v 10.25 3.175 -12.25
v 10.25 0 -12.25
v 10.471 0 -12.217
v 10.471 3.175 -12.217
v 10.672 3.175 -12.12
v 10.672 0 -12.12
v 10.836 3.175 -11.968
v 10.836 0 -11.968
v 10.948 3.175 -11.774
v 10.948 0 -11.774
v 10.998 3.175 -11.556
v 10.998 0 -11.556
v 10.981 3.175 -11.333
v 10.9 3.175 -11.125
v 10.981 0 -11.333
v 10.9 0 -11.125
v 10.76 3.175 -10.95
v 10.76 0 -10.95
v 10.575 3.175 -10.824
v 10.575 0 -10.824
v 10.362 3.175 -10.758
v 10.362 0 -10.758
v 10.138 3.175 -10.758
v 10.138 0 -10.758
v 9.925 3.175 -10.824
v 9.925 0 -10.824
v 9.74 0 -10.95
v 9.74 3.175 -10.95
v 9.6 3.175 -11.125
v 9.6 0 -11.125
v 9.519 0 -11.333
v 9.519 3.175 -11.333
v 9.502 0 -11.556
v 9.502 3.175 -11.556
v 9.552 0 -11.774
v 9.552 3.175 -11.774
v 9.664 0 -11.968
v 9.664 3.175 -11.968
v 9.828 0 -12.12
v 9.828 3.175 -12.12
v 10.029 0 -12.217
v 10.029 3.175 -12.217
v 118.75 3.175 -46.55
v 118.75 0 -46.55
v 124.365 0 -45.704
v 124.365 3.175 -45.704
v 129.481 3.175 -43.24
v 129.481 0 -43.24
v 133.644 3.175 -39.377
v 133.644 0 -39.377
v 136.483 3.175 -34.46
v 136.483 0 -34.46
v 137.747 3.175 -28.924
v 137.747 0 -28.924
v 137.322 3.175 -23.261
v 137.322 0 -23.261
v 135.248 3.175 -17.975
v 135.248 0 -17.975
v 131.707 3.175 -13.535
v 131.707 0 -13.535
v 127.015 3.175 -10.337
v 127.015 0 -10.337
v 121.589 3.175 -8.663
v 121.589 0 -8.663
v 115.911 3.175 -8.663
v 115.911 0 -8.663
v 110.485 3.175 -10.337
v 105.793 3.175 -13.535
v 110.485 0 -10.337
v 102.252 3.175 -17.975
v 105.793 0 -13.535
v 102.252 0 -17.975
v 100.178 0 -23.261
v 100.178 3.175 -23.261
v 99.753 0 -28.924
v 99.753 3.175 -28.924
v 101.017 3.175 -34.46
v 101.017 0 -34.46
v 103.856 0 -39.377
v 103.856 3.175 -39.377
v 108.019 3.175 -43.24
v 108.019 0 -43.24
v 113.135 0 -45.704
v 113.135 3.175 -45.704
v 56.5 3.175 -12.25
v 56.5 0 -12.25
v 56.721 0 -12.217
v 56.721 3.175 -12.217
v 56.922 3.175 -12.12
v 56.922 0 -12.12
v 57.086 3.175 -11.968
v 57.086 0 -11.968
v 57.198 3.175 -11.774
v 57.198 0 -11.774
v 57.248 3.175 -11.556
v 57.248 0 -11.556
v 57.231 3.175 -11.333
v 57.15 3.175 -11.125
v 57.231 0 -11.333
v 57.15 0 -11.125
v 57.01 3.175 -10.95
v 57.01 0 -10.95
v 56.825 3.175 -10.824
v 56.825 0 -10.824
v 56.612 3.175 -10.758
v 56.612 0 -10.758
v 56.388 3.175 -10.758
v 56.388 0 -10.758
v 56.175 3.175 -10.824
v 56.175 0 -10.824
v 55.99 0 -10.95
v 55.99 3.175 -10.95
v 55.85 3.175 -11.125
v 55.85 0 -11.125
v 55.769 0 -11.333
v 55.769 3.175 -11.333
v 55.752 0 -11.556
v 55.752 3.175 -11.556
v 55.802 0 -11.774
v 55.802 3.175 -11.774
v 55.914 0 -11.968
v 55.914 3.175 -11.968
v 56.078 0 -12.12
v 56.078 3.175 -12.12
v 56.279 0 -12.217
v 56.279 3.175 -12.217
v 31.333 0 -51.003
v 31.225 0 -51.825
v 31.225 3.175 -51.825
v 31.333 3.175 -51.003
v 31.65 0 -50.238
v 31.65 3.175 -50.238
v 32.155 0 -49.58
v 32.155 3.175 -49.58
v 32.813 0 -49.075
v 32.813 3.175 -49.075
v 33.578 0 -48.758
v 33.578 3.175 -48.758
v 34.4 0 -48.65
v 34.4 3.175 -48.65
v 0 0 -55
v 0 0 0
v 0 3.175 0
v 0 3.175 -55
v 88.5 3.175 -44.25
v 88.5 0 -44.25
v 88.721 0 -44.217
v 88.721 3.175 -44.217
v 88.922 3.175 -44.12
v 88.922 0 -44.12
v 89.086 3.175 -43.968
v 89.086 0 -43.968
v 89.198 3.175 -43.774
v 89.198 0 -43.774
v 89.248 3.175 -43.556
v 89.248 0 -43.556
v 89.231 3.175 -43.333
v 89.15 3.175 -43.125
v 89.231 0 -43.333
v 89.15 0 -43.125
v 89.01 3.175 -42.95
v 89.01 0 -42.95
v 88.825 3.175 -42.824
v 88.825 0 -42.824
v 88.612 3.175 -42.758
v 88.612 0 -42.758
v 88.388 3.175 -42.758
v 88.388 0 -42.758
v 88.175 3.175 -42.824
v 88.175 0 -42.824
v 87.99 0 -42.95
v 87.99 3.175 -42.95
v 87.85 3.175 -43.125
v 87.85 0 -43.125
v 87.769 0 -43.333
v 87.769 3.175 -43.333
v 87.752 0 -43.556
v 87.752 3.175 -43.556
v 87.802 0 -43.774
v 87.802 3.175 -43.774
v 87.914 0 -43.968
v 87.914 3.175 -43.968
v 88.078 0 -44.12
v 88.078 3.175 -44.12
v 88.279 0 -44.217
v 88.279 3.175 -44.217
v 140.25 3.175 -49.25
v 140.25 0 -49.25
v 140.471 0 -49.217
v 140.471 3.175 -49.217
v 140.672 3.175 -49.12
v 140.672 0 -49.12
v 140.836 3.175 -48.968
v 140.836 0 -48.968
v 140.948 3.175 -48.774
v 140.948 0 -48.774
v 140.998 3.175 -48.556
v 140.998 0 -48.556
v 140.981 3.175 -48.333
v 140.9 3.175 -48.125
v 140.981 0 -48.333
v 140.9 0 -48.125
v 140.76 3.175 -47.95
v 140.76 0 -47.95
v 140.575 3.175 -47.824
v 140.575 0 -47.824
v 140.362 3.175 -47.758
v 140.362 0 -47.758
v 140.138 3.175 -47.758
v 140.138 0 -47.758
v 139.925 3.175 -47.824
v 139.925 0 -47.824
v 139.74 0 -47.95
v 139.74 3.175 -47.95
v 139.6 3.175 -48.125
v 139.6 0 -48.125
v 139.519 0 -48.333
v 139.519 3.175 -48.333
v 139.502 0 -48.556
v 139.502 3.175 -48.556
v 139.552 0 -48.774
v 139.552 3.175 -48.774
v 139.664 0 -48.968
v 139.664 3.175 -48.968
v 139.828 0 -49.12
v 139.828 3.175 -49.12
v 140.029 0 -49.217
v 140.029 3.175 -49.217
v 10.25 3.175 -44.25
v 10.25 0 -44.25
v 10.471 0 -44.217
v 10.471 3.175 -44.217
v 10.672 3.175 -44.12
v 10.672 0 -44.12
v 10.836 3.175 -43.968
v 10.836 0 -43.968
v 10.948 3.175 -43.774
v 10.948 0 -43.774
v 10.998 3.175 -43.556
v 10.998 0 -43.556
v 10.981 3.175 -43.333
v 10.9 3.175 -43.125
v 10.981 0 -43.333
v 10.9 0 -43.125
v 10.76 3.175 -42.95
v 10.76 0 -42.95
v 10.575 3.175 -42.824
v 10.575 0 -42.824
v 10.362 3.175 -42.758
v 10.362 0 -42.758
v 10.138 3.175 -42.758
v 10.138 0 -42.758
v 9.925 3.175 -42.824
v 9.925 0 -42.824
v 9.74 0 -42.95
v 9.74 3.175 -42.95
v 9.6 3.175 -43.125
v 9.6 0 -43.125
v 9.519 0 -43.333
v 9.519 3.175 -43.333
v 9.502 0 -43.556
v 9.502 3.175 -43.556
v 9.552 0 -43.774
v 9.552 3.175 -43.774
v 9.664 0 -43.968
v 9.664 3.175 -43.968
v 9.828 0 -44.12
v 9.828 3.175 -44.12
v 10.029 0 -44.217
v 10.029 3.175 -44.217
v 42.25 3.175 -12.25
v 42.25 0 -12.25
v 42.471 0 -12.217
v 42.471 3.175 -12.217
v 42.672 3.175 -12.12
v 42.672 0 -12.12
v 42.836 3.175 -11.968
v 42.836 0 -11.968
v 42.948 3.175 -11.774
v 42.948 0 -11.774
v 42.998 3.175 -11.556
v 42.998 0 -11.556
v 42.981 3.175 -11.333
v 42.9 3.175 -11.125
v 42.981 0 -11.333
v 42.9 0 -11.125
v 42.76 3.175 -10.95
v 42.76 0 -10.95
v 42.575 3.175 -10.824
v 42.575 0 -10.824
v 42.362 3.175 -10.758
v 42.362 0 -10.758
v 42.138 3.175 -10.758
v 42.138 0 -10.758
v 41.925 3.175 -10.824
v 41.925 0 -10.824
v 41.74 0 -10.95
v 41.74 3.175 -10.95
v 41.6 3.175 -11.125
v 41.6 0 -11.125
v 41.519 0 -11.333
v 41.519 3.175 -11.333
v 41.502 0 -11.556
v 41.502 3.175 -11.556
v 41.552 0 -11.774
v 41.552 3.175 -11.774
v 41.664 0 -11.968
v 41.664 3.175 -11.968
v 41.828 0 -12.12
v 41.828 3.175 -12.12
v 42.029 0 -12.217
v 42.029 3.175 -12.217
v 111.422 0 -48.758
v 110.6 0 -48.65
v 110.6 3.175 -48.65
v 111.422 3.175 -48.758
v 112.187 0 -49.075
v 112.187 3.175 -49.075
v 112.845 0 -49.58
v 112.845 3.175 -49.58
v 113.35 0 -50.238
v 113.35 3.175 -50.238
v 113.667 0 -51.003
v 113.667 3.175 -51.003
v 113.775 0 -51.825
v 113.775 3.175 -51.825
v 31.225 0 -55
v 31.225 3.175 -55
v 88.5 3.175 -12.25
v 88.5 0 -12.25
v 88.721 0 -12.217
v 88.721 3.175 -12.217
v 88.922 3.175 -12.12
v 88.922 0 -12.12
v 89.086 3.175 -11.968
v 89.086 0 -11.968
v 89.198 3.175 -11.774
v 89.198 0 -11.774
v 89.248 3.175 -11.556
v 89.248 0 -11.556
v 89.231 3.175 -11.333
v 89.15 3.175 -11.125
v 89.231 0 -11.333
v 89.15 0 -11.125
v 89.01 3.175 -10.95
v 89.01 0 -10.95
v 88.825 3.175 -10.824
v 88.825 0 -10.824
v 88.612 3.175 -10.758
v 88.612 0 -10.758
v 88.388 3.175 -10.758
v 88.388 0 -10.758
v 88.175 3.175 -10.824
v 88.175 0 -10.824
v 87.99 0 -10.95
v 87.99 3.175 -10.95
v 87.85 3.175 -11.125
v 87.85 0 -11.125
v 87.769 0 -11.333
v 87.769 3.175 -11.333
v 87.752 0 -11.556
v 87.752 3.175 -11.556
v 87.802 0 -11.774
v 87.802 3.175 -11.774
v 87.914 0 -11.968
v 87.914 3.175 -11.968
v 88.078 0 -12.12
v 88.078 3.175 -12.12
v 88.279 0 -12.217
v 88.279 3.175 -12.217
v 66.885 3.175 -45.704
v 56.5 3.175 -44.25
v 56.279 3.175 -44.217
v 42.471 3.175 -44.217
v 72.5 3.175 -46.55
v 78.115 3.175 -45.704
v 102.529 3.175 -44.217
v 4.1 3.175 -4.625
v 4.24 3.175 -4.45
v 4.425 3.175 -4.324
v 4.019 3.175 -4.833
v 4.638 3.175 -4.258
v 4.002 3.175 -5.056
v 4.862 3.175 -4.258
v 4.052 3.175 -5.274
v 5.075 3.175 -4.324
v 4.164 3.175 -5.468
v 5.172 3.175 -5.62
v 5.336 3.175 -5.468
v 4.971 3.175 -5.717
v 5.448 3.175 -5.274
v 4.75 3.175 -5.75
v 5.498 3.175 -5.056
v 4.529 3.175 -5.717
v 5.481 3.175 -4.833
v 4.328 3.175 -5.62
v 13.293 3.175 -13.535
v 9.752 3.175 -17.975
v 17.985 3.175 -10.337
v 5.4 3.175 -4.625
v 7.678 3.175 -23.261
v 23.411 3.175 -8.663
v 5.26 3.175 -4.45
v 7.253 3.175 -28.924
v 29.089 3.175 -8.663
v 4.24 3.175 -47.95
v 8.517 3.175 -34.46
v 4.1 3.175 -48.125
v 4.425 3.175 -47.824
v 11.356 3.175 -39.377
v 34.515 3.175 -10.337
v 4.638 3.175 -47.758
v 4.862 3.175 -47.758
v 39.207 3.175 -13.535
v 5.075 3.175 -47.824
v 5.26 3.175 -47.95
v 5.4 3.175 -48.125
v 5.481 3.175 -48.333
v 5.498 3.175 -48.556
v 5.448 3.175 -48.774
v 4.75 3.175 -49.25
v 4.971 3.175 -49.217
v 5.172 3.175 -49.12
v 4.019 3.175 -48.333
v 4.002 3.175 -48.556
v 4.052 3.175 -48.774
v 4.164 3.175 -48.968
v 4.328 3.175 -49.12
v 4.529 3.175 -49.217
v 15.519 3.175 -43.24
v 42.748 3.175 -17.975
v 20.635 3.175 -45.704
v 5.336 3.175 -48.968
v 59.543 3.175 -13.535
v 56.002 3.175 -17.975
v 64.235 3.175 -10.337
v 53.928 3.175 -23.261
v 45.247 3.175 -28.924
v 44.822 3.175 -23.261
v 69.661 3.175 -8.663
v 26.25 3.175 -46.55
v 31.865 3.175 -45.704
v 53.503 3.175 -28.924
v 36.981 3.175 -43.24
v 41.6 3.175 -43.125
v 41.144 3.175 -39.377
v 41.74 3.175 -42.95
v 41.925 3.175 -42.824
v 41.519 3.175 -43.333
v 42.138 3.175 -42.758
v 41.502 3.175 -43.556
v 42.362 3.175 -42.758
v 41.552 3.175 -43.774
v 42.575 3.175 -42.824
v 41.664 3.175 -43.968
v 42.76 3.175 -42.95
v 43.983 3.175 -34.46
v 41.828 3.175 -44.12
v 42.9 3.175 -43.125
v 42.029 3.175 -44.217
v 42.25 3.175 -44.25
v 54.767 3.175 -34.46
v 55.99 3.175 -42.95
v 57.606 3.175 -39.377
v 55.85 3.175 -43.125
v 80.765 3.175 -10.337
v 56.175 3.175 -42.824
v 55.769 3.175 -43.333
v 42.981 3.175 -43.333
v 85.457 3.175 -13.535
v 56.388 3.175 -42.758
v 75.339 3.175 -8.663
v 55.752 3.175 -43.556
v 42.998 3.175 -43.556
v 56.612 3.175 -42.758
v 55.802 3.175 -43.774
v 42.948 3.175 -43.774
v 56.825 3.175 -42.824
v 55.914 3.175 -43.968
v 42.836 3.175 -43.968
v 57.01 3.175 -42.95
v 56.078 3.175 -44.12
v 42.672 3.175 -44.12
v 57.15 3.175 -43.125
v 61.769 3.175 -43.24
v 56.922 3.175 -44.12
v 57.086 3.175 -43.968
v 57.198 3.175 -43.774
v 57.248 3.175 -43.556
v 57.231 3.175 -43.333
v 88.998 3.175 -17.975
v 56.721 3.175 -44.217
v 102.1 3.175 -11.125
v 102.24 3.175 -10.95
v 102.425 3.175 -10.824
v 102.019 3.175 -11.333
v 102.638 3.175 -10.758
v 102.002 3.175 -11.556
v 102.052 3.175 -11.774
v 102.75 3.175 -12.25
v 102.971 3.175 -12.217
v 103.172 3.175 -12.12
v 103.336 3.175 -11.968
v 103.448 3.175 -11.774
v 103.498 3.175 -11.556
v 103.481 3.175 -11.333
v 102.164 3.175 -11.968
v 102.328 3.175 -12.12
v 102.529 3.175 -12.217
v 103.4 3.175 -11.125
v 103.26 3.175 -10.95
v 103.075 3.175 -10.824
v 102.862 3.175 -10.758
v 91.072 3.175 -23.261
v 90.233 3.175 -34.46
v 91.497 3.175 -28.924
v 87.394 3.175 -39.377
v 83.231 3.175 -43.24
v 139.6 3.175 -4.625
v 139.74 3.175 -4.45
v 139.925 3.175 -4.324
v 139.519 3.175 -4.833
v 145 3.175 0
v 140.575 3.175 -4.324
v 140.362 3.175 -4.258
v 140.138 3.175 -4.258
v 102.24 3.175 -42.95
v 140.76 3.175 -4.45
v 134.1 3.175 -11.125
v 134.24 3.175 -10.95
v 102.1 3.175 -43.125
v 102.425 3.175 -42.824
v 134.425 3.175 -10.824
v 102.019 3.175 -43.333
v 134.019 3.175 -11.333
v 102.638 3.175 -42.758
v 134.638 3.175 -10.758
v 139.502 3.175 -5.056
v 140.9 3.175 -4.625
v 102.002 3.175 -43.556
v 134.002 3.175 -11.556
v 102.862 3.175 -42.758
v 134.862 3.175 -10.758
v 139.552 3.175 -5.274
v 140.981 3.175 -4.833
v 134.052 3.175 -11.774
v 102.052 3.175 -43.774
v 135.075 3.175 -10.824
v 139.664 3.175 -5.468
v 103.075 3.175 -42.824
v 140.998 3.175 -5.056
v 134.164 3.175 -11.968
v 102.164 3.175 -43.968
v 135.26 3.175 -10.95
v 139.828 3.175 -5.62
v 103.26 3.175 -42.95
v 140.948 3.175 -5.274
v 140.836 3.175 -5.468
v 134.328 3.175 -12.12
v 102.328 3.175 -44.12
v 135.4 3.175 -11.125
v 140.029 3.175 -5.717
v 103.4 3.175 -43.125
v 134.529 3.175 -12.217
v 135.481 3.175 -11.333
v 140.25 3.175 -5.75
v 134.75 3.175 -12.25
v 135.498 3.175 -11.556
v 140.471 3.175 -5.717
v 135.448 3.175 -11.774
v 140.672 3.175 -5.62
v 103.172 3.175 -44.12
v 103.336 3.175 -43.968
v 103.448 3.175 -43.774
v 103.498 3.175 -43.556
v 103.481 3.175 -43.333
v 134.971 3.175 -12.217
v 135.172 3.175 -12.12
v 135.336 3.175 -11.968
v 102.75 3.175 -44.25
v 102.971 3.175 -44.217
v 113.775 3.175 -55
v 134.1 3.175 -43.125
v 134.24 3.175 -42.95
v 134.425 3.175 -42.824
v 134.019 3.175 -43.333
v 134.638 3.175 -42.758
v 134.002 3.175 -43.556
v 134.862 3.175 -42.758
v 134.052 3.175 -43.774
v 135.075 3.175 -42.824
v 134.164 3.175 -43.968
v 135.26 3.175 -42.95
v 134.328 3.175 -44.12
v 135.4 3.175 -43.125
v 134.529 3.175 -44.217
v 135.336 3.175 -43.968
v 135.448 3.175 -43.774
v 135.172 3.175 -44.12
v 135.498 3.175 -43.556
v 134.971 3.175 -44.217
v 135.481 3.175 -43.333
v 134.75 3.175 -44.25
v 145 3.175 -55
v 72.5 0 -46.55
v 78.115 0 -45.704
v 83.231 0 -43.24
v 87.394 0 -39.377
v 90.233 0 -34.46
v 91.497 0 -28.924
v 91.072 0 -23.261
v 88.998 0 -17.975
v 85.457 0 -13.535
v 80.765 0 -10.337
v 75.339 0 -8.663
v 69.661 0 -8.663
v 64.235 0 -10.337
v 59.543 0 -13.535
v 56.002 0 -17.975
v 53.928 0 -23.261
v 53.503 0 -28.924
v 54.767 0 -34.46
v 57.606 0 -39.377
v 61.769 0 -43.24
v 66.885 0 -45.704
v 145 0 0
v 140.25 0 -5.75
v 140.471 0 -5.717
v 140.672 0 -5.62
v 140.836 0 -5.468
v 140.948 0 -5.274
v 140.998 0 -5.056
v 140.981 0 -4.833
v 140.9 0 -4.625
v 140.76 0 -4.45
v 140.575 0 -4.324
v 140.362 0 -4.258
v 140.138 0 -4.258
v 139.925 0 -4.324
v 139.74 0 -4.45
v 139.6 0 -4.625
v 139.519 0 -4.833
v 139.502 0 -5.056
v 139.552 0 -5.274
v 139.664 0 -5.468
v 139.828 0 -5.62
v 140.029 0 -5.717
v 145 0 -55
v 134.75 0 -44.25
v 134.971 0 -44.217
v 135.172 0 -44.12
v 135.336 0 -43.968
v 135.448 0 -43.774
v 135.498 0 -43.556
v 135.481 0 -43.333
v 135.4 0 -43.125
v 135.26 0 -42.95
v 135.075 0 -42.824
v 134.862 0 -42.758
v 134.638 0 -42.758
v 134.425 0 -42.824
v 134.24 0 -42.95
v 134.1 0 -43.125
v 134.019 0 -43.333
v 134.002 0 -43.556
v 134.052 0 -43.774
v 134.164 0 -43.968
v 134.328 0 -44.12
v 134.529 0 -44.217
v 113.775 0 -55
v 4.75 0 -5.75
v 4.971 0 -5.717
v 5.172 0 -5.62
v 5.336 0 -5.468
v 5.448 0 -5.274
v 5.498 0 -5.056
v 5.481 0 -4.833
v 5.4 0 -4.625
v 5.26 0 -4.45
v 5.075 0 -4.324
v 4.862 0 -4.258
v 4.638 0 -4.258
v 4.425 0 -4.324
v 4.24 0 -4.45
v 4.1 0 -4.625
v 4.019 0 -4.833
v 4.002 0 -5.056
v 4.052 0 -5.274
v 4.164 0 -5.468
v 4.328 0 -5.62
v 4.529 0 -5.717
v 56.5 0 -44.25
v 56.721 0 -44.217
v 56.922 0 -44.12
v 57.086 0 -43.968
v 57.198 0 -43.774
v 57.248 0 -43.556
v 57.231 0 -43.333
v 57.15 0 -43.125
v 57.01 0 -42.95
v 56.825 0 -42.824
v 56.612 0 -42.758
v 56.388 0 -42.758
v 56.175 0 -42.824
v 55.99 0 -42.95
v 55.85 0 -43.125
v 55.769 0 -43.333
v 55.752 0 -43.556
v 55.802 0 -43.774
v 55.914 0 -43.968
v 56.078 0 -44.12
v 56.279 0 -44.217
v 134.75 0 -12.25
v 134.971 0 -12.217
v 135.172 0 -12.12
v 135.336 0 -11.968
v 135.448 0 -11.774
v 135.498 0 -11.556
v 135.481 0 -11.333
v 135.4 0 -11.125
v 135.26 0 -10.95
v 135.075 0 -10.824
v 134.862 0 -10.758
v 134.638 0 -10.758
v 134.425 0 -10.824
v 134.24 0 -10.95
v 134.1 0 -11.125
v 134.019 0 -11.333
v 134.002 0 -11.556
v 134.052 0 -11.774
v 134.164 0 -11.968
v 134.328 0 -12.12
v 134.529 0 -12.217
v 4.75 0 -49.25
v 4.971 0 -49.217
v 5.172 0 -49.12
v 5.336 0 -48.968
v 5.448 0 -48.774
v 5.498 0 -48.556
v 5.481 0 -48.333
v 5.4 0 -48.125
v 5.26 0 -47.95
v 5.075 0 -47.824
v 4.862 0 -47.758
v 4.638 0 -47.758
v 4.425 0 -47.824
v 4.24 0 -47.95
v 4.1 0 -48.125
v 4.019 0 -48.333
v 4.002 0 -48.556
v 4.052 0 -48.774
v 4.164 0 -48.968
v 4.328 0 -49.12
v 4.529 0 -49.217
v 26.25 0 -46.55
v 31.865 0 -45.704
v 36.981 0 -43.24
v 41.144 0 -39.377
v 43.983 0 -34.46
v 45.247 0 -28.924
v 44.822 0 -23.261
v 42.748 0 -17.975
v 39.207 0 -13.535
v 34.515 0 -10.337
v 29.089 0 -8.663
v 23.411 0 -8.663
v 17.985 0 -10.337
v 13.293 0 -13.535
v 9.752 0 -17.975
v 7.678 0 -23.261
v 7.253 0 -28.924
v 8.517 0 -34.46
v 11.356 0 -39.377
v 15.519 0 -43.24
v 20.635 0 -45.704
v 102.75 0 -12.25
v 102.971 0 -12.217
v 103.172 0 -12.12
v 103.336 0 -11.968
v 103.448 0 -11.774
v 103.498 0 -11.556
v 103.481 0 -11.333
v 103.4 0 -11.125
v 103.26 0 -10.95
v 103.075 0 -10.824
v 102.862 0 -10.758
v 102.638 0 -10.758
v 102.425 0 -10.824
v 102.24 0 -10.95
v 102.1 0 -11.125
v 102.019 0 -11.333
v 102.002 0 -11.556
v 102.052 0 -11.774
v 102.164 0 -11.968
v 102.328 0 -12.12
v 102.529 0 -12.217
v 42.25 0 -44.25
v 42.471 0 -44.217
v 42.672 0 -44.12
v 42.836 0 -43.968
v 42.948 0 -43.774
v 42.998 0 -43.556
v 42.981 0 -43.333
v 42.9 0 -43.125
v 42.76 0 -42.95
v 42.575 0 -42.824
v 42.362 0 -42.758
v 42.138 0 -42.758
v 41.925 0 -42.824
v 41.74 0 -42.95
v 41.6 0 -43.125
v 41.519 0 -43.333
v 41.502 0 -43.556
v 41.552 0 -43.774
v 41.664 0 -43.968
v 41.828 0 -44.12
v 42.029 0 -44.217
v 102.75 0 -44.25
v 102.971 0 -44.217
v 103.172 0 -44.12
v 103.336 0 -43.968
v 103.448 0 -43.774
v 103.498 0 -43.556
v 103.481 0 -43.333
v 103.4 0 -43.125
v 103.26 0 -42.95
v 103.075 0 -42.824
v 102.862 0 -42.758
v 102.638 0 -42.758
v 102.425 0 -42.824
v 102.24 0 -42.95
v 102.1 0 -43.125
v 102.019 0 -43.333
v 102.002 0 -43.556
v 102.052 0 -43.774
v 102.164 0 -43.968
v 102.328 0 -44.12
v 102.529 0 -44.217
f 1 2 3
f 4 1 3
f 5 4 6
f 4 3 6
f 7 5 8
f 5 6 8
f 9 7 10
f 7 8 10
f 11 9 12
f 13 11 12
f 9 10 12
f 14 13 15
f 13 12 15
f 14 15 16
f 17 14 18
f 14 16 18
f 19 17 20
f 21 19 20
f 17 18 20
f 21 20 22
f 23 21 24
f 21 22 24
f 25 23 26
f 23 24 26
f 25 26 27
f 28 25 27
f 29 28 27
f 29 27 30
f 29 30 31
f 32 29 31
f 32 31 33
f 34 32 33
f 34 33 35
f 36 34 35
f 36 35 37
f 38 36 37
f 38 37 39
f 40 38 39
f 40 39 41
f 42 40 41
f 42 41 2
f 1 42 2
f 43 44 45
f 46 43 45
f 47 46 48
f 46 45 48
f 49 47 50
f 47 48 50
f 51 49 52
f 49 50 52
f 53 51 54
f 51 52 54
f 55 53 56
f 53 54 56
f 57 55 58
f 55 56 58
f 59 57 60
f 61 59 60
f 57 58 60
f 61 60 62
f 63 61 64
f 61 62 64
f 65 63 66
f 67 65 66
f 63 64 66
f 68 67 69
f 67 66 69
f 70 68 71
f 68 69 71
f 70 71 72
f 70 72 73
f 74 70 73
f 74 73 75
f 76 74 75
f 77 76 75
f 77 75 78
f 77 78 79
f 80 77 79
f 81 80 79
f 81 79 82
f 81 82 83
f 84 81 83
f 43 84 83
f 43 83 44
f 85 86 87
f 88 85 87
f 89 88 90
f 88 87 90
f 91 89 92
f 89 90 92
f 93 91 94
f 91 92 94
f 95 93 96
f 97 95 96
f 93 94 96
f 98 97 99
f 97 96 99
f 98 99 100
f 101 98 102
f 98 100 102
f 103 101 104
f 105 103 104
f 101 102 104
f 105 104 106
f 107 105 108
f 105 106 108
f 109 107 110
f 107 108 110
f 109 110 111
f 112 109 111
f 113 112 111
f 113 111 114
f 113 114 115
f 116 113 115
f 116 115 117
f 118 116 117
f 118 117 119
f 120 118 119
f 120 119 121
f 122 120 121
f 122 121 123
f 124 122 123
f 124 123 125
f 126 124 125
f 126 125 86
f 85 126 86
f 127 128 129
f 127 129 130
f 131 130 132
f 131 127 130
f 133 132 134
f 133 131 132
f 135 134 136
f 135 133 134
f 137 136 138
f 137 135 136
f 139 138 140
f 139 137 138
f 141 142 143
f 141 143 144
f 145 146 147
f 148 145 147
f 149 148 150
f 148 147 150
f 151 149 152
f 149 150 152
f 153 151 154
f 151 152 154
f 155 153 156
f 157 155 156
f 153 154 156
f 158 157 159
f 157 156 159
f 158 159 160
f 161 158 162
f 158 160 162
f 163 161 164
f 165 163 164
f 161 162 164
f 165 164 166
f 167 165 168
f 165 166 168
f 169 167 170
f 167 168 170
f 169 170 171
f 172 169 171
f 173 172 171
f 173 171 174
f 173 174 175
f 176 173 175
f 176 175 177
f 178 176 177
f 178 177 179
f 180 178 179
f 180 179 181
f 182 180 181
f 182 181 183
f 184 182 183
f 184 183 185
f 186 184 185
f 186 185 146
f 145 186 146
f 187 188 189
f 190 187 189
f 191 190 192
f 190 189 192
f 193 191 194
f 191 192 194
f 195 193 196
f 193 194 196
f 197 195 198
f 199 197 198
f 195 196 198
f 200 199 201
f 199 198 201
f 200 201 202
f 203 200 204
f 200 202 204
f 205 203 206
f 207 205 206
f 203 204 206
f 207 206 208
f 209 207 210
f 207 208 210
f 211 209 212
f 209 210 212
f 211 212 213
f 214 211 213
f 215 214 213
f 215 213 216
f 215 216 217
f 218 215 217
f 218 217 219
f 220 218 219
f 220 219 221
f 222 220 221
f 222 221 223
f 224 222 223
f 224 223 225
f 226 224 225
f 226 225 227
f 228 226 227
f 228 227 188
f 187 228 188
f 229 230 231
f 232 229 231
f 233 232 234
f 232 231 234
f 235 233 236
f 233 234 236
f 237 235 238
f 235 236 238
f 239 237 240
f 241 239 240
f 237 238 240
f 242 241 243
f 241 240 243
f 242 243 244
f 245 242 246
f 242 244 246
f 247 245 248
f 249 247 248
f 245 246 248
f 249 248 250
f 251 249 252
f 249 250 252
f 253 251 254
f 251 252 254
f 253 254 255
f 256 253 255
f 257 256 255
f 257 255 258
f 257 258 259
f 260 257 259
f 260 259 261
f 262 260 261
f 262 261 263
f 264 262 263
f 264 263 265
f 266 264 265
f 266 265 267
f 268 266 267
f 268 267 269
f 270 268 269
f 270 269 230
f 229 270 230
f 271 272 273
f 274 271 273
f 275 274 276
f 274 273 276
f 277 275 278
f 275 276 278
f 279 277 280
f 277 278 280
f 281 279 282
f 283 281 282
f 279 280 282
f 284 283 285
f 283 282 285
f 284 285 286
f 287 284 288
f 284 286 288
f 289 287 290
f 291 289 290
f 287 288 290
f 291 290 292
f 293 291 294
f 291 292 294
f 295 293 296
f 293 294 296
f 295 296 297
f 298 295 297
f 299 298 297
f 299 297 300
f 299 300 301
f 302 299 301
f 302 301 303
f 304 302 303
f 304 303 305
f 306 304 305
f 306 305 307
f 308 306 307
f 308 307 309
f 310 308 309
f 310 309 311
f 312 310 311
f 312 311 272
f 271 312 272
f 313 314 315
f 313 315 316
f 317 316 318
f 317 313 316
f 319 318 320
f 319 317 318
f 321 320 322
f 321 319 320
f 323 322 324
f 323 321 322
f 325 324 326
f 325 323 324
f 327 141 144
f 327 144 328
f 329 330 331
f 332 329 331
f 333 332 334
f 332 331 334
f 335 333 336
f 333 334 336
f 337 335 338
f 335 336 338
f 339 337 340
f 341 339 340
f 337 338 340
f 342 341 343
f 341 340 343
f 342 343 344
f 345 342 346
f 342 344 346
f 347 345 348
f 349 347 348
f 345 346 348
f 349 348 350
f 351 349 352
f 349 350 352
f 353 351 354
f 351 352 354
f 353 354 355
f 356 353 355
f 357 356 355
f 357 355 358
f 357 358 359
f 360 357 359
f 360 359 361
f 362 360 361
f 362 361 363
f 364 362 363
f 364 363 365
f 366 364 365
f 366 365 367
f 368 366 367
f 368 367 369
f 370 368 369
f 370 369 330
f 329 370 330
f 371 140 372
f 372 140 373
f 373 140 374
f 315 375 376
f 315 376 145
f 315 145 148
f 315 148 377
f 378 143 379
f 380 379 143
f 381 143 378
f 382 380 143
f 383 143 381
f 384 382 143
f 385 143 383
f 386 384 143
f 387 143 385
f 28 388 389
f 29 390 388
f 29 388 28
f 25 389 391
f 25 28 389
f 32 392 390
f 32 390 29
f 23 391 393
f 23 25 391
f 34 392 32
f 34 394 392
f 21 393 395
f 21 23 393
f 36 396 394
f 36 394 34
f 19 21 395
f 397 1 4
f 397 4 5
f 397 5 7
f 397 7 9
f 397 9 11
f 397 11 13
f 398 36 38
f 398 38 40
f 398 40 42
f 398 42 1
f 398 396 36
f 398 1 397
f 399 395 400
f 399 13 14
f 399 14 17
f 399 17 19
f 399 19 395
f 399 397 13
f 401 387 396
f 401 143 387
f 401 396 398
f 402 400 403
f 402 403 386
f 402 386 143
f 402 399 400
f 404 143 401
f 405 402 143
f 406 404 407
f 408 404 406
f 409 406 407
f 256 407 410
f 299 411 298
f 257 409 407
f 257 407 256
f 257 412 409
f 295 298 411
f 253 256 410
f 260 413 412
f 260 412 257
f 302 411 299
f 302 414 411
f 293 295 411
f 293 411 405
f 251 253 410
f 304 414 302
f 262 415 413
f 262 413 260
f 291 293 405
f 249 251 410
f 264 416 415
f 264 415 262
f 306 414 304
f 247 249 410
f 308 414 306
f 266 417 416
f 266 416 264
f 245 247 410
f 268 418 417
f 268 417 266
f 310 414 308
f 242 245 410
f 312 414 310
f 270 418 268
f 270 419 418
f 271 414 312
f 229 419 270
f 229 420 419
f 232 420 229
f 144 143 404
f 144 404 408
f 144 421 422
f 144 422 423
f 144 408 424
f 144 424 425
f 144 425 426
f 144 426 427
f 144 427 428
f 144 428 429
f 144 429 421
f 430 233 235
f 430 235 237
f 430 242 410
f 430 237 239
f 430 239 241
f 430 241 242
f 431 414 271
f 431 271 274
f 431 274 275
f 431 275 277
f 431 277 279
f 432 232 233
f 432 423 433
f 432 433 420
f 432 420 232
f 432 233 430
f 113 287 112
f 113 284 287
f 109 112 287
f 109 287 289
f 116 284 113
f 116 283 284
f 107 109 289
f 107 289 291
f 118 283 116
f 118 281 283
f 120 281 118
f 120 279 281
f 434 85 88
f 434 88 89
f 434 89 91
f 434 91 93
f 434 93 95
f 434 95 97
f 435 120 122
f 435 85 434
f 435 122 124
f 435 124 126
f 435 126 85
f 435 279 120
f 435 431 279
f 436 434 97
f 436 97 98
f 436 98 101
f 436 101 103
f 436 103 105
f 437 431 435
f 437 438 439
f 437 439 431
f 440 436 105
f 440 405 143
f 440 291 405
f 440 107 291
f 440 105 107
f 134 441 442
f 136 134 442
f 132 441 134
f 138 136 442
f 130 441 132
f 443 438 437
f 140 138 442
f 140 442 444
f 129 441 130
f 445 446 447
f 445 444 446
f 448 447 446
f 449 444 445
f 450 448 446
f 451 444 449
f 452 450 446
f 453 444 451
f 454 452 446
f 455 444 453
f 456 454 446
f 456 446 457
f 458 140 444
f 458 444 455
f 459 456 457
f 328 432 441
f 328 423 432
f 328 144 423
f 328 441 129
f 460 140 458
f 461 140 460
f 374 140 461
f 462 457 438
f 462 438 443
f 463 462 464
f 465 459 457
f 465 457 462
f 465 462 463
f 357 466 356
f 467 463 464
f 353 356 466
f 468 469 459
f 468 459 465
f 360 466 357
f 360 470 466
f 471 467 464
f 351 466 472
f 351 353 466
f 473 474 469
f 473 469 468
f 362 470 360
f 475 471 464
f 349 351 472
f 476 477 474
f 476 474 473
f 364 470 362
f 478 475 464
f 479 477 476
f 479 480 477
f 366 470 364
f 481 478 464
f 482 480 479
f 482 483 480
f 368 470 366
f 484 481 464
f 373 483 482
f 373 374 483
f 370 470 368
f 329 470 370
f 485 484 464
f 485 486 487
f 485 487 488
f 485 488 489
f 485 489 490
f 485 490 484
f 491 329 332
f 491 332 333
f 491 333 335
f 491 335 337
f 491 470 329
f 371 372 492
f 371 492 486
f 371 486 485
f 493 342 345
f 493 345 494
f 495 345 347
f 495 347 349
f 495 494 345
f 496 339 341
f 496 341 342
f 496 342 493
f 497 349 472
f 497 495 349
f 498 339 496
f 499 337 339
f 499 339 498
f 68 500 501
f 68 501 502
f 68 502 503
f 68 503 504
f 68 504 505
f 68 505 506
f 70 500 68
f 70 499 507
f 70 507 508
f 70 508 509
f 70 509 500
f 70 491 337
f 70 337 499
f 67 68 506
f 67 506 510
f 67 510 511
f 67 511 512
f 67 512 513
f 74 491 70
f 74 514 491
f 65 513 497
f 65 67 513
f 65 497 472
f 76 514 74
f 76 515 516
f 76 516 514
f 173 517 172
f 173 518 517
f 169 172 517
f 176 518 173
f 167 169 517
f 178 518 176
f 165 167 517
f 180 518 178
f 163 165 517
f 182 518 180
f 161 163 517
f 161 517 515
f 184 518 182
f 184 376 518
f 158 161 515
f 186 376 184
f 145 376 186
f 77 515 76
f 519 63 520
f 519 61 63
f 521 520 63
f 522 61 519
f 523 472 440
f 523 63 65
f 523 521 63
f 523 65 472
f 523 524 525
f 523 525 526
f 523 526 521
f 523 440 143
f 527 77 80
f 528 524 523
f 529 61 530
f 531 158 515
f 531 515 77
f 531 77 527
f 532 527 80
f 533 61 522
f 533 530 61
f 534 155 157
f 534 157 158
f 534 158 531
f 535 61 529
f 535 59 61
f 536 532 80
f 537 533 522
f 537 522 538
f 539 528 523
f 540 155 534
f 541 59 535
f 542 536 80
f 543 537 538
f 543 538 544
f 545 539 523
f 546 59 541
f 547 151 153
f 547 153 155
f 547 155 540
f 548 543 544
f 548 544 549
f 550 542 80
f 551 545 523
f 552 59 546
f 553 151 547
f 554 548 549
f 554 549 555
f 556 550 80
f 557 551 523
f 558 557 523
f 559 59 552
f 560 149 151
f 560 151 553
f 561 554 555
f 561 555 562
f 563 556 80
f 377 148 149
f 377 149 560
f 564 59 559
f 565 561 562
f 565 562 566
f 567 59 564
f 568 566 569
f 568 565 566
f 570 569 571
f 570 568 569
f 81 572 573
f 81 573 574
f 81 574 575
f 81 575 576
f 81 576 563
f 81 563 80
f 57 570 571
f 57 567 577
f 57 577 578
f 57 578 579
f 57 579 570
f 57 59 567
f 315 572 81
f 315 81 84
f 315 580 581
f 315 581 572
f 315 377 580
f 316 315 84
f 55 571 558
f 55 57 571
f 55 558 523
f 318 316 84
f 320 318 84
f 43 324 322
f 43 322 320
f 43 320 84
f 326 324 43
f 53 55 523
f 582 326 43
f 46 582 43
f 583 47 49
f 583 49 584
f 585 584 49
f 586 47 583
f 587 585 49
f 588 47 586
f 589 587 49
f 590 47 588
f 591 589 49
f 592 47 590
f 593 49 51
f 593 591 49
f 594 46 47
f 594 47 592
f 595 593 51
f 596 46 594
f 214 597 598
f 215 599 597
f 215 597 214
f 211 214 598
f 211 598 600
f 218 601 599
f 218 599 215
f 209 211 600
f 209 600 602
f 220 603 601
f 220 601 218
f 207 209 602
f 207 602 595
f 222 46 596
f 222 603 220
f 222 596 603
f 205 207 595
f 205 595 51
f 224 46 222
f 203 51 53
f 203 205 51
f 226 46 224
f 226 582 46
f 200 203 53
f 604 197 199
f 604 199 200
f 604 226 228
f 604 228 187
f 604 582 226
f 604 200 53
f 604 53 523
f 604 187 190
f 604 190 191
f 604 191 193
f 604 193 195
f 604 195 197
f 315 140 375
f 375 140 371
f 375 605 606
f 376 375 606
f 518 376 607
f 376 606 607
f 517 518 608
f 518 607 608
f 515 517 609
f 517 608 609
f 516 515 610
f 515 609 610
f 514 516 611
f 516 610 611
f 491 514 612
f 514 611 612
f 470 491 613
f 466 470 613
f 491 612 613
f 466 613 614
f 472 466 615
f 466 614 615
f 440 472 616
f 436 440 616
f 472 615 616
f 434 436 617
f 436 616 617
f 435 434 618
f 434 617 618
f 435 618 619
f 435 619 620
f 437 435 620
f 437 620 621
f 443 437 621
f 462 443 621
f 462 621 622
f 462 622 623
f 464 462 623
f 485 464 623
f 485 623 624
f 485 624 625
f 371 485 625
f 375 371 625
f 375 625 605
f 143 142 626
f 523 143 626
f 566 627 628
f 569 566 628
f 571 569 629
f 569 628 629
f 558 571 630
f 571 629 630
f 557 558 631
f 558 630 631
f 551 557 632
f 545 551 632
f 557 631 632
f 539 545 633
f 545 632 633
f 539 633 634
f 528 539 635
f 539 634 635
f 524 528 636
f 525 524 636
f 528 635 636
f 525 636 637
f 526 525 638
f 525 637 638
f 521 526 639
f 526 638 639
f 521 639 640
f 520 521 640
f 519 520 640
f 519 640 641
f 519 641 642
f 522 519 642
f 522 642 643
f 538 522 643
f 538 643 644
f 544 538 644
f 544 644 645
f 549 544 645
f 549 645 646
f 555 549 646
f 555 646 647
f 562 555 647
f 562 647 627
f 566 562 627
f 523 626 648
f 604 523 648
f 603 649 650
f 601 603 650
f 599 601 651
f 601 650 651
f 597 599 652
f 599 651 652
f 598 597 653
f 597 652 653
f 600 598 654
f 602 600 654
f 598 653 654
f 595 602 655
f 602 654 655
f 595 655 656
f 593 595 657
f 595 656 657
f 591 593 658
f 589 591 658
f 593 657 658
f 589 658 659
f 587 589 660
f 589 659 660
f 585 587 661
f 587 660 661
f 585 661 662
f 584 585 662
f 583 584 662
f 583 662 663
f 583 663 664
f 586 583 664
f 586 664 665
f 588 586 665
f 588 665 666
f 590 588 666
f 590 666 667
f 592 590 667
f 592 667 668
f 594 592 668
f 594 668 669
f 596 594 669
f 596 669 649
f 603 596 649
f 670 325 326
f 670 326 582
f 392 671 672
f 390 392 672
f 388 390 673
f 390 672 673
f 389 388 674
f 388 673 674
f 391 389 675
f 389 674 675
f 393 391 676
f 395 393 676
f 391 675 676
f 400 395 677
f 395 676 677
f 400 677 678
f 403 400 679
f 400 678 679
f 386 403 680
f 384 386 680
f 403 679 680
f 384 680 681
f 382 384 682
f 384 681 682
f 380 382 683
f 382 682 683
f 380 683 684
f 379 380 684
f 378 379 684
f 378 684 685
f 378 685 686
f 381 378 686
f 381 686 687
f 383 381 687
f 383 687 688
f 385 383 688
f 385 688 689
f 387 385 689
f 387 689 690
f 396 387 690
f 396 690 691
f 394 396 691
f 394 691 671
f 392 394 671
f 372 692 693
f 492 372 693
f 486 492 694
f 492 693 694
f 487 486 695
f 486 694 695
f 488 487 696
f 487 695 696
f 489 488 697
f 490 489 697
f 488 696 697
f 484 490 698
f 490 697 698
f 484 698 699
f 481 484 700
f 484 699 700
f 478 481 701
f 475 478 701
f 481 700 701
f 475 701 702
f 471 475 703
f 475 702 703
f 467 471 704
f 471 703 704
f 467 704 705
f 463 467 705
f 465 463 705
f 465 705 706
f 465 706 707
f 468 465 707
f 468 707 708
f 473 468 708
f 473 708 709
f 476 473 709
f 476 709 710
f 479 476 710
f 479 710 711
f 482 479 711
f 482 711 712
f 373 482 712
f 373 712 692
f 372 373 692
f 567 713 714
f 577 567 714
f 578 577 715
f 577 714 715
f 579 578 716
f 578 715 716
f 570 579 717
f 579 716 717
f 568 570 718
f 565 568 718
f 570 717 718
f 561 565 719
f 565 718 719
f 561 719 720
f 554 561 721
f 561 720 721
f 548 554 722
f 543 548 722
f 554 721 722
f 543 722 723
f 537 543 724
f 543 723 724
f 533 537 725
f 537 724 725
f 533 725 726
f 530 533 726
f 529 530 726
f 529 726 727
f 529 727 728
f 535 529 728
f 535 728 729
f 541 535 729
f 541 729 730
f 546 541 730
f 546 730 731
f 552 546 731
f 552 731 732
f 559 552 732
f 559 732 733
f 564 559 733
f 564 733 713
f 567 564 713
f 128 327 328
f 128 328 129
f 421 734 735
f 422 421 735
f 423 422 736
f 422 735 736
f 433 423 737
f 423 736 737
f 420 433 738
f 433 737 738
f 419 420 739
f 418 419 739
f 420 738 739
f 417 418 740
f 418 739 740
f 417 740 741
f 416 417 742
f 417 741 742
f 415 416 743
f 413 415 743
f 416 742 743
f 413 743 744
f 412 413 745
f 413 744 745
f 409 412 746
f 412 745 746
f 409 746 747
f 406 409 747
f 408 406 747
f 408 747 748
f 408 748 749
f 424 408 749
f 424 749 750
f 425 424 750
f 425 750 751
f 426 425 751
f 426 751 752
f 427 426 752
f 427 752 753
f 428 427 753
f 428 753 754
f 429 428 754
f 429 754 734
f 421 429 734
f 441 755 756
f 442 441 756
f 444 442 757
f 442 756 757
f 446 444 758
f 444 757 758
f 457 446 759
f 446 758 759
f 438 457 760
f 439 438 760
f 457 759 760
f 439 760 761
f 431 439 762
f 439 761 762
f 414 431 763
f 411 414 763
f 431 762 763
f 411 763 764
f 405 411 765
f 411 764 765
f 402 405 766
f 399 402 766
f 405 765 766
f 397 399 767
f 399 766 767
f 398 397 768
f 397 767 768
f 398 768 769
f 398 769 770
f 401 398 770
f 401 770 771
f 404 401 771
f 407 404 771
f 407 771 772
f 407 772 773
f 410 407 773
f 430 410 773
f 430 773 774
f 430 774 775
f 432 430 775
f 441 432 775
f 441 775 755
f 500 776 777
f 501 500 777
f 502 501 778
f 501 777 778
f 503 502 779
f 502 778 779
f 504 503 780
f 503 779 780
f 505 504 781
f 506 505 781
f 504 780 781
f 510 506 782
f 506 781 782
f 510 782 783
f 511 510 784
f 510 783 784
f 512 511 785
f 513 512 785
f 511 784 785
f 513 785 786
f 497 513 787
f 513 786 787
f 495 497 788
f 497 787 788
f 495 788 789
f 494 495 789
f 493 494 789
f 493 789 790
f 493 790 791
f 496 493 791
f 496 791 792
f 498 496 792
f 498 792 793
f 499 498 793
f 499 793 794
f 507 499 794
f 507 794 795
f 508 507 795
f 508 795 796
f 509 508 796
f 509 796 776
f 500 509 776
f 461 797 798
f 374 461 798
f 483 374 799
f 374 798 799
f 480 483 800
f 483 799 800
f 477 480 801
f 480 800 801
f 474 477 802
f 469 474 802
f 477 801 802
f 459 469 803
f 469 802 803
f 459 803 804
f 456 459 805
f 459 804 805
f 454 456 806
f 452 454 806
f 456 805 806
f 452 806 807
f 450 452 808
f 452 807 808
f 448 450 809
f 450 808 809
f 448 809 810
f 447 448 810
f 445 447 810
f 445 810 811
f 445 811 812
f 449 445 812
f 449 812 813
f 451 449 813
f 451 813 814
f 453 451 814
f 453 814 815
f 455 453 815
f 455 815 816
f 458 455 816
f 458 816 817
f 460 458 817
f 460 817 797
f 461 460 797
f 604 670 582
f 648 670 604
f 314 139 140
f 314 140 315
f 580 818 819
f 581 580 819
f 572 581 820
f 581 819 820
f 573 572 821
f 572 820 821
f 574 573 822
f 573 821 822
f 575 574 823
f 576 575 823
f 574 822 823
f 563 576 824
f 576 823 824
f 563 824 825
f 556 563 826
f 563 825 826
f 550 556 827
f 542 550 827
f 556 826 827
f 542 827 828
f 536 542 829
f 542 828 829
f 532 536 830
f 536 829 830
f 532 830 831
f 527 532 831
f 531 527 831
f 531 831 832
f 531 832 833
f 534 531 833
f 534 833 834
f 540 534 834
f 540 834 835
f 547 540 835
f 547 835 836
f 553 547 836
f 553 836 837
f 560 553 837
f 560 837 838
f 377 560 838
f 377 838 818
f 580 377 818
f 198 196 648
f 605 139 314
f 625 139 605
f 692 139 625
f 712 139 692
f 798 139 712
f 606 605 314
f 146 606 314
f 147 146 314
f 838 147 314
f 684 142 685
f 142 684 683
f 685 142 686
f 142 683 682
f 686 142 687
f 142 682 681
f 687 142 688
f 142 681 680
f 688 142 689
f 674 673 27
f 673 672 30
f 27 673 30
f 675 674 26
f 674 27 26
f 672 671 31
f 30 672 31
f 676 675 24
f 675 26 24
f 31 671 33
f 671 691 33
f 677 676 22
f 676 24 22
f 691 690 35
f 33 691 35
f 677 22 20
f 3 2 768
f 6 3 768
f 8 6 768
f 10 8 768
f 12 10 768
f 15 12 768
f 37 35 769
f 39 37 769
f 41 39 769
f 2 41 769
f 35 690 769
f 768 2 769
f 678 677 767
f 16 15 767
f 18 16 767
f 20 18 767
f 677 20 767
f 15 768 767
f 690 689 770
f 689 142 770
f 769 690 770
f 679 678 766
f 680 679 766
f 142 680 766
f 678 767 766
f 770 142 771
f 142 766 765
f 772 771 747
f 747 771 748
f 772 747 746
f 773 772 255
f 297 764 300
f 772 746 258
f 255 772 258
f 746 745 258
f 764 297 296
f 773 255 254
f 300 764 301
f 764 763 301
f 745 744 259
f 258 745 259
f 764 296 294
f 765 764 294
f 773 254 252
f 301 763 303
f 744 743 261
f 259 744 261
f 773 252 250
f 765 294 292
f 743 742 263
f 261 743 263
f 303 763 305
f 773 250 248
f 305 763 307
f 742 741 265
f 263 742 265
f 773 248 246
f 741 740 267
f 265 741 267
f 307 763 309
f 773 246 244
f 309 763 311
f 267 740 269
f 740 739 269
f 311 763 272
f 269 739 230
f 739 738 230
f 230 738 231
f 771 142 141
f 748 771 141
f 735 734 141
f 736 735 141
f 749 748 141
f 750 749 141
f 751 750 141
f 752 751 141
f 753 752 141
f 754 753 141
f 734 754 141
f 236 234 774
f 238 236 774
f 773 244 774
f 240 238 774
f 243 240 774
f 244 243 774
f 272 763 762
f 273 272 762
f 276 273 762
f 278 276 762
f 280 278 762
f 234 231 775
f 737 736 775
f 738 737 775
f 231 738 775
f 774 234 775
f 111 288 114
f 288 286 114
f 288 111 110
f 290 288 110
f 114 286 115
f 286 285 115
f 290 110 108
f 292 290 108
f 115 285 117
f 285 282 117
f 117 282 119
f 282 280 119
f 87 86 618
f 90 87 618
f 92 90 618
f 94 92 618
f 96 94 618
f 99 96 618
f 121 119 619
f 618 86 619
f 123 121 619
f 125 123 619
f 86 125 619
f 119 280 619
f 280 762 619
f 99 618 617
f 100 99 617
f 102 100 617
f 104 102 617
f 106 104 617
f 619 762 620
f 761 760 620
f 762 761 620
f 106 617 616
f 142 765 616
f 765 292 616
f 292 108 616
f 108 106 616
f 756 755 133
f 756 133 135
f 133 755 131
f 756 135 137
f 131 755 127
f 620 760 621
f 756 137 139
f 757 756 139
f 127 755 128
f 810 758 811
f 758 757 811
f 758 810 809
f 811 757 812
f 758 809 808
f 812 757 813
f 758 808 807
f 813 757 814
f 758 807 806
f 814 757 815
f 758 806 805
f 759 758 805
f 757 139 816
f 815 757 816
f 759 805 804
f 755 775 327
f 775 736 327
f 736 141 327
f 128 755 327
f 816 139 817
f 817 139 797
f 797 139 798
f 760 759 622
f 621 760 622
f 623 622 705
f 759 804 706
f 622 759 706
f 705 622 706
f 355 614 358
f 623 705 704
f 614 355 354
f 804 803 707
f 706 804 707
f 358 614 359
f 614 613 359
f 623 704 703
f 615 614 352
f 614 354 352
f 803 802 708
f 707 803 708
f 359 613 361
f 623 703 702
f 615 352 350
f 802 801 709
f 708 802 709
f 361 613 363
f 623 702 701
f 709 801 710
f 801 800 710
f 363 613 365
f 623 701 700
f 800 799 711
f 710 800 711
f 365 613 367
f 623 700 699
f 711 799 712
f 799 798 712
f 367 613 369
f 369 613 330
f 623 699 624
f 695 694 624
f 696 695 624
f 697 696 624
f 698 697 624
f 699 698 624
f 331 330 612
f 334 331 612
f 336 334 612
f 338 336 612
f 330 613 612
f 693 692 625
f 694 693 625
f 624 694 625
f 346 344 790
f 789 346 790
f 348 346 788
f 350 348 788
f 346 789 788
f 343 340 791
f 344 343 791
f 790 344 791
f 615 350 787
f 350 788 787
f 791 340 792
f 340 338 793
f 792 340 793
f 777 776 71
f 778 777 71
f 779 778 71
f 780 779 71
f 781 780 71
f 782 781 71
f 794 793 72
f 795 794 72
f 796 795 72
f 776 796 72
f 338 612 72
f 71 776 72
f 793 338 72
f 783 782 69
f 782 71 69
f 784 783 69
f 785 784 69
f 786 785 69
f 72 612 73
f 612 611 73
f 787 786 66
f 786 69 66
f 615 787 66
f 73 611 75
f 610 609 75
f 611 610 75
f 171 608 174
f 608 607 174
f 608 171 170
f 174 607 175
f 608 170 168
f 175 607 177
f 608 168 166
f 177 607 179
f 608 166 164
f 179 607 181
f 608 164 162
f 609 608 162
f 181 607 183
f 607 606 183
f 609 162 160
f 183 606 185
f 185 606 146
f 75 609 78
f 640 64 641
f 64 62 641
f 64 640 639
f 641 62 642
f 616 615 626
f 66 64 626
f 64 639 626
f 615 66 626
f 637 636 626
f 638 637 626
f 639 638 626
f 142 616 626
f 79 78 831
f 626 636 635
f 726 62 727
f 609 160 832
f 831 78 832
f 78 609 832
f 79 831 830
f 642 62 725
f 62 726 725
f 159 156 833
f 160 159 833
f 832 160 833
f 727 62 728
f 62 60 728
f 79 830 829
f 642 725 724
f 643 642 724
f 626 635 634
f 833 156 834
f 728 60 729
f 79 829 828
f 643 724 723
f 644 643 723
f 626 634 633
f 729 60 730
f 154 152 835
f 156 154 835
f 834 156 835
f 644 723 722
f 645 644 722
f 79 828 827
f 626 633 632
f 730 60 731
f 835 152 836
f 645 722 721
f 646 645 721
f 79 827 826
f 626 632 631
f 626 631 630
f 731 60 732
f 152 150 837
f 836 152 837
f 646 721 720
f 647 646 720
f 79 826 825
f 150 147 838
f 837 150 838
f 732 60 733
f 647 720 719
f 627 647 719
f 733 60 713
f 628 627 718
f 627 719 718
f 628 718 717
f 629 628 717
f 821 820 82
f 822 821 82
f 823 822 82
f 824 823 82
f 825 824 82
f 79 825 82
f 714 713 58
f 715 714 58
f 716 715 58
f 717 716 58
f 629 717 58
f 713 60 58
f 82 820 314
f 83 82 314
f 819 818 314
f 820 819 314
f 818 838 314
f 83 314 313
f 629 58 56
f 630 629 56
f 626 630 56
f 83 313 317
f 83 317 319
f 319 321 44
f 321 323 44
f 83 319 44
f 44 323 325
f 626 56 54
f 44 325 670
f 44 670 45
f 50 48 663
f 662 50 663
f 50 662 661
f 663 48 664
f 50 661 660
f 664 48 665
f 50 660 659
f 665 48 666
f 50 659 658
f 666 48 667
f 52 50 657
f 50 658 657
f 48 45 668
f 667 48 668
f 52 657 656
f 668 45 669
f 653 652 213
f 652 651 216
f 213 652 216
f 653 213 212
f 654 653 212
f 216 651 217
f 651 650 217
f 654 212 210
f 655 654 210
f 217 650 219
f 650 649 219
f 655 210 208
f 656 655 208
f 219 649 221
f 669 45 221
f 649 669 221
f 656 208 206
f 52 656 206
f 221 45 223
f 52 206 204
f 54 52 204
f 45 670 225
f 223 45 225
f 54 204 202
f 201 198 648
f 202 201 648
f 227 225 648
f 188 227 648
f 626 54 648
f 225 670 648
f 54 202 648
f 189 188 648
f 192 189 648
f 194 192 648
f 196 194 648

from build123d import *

# Parameters (mm, degrees)
SKETCH1_W           = 145
SKETCH1_H           = 55
BOSS_EXTRUDE1_DEPTH = 3.175
SKETCH4_R           = 0.75
SKETCH4_R_2         = 19.05
CUT_EXTRUDE1_DEPTH  = 156.113122027


with BuildPart() as part:
    # Sketch1 → Boss-Extrude1 (new body)
    with BuildSketch(Plane(origin=(0, 0, 0), x_dir=(1, 0, 0), z_dir=(0, 1, 0))):
        with Locations((72.5, 27.5)):
            Rectangle(SKETCH1_W, SKETCH1_H)
    extrude(amount=BOSS_EXTRUDE1_DEPTH)

    # Sketch4 → Cut-Extrude1 (cut, through all)
    with BuildSketch(Plane.XZ):
        with Locations((10.25, -11.5)):
            Circle(SKETCH4_R)
        with Locations((10.25, -43.5)):
            Circle(SKETCH4_R)
        with Locations((42.25, -43.5)):
            Circle(SKETCH4_R)
        with Locations((26.25, -27.5)):
            Circle(SKETCH4_R_2)
        with Locations((42.25, -11.5)):
            Circle(SKETCH4_R)
        with Locations((56.5, -11.5)):
            Circle(SKETCH4_R)
        with Locations((56.5, -43.5)):
            Circle(SKETCH4_R)
        with Locations((88.5, -43.5)):
            Circle(SKETCH4_R)
        with Locations((88.5, -11.5)):
            Circle(SKETCH4_R)
        with Locations((72.5, -27.5)):
            Circle(SKETCH4_R_2)
        with Locations((102.75, -11.5)):
            Circle(SKETCH4_R)
        with Locations((102.75, -43.5)):
            Circle(SKETCH4_R)
        with Locations((134.75, -43.5)):
            Circle(SKETCH4_R)
        with Locations((134.75, -11.5)):
            Circle(SKETCH4_R)
        with Locations((118.75, -27.5)):
            Circle(SKETCH4_R_2)
        with Locations((4.750000369, -48.50000744)):
            Circle(SKETCH4_R)
        with Locations((4.749998796, -5.00000808)):
            Circle(SKETCH4_R)
        with Locations((140.249999576, -5.00000318)):
            Circle(SKETCH4_R)
        with Locations((140.250001149, -48.50000254)):
            Circle(SKETCH4_R)
        with BuildLine():
            Line((113.775, -51.825), (113.775, -55))
            Line((113.775, -55), (31.225, -55))
            Line((31.225, -55), (31.225, -51.825))
            ThreePointArc((31.225, -51.825), (32.15493597, -49.57993597), (34.4, -48.65))
            Line((34.4, -48.65), (110.6, -48.65))
            ThreePointArc((110.6, -48.65), (112.84506403, -49.57993597), (113.775, -51.825))
        make_face()
    extrude(amount=-CUT_EXTRUDE1_DEPTH, mode=Mode.SUBTRACT)


solid = part.part
